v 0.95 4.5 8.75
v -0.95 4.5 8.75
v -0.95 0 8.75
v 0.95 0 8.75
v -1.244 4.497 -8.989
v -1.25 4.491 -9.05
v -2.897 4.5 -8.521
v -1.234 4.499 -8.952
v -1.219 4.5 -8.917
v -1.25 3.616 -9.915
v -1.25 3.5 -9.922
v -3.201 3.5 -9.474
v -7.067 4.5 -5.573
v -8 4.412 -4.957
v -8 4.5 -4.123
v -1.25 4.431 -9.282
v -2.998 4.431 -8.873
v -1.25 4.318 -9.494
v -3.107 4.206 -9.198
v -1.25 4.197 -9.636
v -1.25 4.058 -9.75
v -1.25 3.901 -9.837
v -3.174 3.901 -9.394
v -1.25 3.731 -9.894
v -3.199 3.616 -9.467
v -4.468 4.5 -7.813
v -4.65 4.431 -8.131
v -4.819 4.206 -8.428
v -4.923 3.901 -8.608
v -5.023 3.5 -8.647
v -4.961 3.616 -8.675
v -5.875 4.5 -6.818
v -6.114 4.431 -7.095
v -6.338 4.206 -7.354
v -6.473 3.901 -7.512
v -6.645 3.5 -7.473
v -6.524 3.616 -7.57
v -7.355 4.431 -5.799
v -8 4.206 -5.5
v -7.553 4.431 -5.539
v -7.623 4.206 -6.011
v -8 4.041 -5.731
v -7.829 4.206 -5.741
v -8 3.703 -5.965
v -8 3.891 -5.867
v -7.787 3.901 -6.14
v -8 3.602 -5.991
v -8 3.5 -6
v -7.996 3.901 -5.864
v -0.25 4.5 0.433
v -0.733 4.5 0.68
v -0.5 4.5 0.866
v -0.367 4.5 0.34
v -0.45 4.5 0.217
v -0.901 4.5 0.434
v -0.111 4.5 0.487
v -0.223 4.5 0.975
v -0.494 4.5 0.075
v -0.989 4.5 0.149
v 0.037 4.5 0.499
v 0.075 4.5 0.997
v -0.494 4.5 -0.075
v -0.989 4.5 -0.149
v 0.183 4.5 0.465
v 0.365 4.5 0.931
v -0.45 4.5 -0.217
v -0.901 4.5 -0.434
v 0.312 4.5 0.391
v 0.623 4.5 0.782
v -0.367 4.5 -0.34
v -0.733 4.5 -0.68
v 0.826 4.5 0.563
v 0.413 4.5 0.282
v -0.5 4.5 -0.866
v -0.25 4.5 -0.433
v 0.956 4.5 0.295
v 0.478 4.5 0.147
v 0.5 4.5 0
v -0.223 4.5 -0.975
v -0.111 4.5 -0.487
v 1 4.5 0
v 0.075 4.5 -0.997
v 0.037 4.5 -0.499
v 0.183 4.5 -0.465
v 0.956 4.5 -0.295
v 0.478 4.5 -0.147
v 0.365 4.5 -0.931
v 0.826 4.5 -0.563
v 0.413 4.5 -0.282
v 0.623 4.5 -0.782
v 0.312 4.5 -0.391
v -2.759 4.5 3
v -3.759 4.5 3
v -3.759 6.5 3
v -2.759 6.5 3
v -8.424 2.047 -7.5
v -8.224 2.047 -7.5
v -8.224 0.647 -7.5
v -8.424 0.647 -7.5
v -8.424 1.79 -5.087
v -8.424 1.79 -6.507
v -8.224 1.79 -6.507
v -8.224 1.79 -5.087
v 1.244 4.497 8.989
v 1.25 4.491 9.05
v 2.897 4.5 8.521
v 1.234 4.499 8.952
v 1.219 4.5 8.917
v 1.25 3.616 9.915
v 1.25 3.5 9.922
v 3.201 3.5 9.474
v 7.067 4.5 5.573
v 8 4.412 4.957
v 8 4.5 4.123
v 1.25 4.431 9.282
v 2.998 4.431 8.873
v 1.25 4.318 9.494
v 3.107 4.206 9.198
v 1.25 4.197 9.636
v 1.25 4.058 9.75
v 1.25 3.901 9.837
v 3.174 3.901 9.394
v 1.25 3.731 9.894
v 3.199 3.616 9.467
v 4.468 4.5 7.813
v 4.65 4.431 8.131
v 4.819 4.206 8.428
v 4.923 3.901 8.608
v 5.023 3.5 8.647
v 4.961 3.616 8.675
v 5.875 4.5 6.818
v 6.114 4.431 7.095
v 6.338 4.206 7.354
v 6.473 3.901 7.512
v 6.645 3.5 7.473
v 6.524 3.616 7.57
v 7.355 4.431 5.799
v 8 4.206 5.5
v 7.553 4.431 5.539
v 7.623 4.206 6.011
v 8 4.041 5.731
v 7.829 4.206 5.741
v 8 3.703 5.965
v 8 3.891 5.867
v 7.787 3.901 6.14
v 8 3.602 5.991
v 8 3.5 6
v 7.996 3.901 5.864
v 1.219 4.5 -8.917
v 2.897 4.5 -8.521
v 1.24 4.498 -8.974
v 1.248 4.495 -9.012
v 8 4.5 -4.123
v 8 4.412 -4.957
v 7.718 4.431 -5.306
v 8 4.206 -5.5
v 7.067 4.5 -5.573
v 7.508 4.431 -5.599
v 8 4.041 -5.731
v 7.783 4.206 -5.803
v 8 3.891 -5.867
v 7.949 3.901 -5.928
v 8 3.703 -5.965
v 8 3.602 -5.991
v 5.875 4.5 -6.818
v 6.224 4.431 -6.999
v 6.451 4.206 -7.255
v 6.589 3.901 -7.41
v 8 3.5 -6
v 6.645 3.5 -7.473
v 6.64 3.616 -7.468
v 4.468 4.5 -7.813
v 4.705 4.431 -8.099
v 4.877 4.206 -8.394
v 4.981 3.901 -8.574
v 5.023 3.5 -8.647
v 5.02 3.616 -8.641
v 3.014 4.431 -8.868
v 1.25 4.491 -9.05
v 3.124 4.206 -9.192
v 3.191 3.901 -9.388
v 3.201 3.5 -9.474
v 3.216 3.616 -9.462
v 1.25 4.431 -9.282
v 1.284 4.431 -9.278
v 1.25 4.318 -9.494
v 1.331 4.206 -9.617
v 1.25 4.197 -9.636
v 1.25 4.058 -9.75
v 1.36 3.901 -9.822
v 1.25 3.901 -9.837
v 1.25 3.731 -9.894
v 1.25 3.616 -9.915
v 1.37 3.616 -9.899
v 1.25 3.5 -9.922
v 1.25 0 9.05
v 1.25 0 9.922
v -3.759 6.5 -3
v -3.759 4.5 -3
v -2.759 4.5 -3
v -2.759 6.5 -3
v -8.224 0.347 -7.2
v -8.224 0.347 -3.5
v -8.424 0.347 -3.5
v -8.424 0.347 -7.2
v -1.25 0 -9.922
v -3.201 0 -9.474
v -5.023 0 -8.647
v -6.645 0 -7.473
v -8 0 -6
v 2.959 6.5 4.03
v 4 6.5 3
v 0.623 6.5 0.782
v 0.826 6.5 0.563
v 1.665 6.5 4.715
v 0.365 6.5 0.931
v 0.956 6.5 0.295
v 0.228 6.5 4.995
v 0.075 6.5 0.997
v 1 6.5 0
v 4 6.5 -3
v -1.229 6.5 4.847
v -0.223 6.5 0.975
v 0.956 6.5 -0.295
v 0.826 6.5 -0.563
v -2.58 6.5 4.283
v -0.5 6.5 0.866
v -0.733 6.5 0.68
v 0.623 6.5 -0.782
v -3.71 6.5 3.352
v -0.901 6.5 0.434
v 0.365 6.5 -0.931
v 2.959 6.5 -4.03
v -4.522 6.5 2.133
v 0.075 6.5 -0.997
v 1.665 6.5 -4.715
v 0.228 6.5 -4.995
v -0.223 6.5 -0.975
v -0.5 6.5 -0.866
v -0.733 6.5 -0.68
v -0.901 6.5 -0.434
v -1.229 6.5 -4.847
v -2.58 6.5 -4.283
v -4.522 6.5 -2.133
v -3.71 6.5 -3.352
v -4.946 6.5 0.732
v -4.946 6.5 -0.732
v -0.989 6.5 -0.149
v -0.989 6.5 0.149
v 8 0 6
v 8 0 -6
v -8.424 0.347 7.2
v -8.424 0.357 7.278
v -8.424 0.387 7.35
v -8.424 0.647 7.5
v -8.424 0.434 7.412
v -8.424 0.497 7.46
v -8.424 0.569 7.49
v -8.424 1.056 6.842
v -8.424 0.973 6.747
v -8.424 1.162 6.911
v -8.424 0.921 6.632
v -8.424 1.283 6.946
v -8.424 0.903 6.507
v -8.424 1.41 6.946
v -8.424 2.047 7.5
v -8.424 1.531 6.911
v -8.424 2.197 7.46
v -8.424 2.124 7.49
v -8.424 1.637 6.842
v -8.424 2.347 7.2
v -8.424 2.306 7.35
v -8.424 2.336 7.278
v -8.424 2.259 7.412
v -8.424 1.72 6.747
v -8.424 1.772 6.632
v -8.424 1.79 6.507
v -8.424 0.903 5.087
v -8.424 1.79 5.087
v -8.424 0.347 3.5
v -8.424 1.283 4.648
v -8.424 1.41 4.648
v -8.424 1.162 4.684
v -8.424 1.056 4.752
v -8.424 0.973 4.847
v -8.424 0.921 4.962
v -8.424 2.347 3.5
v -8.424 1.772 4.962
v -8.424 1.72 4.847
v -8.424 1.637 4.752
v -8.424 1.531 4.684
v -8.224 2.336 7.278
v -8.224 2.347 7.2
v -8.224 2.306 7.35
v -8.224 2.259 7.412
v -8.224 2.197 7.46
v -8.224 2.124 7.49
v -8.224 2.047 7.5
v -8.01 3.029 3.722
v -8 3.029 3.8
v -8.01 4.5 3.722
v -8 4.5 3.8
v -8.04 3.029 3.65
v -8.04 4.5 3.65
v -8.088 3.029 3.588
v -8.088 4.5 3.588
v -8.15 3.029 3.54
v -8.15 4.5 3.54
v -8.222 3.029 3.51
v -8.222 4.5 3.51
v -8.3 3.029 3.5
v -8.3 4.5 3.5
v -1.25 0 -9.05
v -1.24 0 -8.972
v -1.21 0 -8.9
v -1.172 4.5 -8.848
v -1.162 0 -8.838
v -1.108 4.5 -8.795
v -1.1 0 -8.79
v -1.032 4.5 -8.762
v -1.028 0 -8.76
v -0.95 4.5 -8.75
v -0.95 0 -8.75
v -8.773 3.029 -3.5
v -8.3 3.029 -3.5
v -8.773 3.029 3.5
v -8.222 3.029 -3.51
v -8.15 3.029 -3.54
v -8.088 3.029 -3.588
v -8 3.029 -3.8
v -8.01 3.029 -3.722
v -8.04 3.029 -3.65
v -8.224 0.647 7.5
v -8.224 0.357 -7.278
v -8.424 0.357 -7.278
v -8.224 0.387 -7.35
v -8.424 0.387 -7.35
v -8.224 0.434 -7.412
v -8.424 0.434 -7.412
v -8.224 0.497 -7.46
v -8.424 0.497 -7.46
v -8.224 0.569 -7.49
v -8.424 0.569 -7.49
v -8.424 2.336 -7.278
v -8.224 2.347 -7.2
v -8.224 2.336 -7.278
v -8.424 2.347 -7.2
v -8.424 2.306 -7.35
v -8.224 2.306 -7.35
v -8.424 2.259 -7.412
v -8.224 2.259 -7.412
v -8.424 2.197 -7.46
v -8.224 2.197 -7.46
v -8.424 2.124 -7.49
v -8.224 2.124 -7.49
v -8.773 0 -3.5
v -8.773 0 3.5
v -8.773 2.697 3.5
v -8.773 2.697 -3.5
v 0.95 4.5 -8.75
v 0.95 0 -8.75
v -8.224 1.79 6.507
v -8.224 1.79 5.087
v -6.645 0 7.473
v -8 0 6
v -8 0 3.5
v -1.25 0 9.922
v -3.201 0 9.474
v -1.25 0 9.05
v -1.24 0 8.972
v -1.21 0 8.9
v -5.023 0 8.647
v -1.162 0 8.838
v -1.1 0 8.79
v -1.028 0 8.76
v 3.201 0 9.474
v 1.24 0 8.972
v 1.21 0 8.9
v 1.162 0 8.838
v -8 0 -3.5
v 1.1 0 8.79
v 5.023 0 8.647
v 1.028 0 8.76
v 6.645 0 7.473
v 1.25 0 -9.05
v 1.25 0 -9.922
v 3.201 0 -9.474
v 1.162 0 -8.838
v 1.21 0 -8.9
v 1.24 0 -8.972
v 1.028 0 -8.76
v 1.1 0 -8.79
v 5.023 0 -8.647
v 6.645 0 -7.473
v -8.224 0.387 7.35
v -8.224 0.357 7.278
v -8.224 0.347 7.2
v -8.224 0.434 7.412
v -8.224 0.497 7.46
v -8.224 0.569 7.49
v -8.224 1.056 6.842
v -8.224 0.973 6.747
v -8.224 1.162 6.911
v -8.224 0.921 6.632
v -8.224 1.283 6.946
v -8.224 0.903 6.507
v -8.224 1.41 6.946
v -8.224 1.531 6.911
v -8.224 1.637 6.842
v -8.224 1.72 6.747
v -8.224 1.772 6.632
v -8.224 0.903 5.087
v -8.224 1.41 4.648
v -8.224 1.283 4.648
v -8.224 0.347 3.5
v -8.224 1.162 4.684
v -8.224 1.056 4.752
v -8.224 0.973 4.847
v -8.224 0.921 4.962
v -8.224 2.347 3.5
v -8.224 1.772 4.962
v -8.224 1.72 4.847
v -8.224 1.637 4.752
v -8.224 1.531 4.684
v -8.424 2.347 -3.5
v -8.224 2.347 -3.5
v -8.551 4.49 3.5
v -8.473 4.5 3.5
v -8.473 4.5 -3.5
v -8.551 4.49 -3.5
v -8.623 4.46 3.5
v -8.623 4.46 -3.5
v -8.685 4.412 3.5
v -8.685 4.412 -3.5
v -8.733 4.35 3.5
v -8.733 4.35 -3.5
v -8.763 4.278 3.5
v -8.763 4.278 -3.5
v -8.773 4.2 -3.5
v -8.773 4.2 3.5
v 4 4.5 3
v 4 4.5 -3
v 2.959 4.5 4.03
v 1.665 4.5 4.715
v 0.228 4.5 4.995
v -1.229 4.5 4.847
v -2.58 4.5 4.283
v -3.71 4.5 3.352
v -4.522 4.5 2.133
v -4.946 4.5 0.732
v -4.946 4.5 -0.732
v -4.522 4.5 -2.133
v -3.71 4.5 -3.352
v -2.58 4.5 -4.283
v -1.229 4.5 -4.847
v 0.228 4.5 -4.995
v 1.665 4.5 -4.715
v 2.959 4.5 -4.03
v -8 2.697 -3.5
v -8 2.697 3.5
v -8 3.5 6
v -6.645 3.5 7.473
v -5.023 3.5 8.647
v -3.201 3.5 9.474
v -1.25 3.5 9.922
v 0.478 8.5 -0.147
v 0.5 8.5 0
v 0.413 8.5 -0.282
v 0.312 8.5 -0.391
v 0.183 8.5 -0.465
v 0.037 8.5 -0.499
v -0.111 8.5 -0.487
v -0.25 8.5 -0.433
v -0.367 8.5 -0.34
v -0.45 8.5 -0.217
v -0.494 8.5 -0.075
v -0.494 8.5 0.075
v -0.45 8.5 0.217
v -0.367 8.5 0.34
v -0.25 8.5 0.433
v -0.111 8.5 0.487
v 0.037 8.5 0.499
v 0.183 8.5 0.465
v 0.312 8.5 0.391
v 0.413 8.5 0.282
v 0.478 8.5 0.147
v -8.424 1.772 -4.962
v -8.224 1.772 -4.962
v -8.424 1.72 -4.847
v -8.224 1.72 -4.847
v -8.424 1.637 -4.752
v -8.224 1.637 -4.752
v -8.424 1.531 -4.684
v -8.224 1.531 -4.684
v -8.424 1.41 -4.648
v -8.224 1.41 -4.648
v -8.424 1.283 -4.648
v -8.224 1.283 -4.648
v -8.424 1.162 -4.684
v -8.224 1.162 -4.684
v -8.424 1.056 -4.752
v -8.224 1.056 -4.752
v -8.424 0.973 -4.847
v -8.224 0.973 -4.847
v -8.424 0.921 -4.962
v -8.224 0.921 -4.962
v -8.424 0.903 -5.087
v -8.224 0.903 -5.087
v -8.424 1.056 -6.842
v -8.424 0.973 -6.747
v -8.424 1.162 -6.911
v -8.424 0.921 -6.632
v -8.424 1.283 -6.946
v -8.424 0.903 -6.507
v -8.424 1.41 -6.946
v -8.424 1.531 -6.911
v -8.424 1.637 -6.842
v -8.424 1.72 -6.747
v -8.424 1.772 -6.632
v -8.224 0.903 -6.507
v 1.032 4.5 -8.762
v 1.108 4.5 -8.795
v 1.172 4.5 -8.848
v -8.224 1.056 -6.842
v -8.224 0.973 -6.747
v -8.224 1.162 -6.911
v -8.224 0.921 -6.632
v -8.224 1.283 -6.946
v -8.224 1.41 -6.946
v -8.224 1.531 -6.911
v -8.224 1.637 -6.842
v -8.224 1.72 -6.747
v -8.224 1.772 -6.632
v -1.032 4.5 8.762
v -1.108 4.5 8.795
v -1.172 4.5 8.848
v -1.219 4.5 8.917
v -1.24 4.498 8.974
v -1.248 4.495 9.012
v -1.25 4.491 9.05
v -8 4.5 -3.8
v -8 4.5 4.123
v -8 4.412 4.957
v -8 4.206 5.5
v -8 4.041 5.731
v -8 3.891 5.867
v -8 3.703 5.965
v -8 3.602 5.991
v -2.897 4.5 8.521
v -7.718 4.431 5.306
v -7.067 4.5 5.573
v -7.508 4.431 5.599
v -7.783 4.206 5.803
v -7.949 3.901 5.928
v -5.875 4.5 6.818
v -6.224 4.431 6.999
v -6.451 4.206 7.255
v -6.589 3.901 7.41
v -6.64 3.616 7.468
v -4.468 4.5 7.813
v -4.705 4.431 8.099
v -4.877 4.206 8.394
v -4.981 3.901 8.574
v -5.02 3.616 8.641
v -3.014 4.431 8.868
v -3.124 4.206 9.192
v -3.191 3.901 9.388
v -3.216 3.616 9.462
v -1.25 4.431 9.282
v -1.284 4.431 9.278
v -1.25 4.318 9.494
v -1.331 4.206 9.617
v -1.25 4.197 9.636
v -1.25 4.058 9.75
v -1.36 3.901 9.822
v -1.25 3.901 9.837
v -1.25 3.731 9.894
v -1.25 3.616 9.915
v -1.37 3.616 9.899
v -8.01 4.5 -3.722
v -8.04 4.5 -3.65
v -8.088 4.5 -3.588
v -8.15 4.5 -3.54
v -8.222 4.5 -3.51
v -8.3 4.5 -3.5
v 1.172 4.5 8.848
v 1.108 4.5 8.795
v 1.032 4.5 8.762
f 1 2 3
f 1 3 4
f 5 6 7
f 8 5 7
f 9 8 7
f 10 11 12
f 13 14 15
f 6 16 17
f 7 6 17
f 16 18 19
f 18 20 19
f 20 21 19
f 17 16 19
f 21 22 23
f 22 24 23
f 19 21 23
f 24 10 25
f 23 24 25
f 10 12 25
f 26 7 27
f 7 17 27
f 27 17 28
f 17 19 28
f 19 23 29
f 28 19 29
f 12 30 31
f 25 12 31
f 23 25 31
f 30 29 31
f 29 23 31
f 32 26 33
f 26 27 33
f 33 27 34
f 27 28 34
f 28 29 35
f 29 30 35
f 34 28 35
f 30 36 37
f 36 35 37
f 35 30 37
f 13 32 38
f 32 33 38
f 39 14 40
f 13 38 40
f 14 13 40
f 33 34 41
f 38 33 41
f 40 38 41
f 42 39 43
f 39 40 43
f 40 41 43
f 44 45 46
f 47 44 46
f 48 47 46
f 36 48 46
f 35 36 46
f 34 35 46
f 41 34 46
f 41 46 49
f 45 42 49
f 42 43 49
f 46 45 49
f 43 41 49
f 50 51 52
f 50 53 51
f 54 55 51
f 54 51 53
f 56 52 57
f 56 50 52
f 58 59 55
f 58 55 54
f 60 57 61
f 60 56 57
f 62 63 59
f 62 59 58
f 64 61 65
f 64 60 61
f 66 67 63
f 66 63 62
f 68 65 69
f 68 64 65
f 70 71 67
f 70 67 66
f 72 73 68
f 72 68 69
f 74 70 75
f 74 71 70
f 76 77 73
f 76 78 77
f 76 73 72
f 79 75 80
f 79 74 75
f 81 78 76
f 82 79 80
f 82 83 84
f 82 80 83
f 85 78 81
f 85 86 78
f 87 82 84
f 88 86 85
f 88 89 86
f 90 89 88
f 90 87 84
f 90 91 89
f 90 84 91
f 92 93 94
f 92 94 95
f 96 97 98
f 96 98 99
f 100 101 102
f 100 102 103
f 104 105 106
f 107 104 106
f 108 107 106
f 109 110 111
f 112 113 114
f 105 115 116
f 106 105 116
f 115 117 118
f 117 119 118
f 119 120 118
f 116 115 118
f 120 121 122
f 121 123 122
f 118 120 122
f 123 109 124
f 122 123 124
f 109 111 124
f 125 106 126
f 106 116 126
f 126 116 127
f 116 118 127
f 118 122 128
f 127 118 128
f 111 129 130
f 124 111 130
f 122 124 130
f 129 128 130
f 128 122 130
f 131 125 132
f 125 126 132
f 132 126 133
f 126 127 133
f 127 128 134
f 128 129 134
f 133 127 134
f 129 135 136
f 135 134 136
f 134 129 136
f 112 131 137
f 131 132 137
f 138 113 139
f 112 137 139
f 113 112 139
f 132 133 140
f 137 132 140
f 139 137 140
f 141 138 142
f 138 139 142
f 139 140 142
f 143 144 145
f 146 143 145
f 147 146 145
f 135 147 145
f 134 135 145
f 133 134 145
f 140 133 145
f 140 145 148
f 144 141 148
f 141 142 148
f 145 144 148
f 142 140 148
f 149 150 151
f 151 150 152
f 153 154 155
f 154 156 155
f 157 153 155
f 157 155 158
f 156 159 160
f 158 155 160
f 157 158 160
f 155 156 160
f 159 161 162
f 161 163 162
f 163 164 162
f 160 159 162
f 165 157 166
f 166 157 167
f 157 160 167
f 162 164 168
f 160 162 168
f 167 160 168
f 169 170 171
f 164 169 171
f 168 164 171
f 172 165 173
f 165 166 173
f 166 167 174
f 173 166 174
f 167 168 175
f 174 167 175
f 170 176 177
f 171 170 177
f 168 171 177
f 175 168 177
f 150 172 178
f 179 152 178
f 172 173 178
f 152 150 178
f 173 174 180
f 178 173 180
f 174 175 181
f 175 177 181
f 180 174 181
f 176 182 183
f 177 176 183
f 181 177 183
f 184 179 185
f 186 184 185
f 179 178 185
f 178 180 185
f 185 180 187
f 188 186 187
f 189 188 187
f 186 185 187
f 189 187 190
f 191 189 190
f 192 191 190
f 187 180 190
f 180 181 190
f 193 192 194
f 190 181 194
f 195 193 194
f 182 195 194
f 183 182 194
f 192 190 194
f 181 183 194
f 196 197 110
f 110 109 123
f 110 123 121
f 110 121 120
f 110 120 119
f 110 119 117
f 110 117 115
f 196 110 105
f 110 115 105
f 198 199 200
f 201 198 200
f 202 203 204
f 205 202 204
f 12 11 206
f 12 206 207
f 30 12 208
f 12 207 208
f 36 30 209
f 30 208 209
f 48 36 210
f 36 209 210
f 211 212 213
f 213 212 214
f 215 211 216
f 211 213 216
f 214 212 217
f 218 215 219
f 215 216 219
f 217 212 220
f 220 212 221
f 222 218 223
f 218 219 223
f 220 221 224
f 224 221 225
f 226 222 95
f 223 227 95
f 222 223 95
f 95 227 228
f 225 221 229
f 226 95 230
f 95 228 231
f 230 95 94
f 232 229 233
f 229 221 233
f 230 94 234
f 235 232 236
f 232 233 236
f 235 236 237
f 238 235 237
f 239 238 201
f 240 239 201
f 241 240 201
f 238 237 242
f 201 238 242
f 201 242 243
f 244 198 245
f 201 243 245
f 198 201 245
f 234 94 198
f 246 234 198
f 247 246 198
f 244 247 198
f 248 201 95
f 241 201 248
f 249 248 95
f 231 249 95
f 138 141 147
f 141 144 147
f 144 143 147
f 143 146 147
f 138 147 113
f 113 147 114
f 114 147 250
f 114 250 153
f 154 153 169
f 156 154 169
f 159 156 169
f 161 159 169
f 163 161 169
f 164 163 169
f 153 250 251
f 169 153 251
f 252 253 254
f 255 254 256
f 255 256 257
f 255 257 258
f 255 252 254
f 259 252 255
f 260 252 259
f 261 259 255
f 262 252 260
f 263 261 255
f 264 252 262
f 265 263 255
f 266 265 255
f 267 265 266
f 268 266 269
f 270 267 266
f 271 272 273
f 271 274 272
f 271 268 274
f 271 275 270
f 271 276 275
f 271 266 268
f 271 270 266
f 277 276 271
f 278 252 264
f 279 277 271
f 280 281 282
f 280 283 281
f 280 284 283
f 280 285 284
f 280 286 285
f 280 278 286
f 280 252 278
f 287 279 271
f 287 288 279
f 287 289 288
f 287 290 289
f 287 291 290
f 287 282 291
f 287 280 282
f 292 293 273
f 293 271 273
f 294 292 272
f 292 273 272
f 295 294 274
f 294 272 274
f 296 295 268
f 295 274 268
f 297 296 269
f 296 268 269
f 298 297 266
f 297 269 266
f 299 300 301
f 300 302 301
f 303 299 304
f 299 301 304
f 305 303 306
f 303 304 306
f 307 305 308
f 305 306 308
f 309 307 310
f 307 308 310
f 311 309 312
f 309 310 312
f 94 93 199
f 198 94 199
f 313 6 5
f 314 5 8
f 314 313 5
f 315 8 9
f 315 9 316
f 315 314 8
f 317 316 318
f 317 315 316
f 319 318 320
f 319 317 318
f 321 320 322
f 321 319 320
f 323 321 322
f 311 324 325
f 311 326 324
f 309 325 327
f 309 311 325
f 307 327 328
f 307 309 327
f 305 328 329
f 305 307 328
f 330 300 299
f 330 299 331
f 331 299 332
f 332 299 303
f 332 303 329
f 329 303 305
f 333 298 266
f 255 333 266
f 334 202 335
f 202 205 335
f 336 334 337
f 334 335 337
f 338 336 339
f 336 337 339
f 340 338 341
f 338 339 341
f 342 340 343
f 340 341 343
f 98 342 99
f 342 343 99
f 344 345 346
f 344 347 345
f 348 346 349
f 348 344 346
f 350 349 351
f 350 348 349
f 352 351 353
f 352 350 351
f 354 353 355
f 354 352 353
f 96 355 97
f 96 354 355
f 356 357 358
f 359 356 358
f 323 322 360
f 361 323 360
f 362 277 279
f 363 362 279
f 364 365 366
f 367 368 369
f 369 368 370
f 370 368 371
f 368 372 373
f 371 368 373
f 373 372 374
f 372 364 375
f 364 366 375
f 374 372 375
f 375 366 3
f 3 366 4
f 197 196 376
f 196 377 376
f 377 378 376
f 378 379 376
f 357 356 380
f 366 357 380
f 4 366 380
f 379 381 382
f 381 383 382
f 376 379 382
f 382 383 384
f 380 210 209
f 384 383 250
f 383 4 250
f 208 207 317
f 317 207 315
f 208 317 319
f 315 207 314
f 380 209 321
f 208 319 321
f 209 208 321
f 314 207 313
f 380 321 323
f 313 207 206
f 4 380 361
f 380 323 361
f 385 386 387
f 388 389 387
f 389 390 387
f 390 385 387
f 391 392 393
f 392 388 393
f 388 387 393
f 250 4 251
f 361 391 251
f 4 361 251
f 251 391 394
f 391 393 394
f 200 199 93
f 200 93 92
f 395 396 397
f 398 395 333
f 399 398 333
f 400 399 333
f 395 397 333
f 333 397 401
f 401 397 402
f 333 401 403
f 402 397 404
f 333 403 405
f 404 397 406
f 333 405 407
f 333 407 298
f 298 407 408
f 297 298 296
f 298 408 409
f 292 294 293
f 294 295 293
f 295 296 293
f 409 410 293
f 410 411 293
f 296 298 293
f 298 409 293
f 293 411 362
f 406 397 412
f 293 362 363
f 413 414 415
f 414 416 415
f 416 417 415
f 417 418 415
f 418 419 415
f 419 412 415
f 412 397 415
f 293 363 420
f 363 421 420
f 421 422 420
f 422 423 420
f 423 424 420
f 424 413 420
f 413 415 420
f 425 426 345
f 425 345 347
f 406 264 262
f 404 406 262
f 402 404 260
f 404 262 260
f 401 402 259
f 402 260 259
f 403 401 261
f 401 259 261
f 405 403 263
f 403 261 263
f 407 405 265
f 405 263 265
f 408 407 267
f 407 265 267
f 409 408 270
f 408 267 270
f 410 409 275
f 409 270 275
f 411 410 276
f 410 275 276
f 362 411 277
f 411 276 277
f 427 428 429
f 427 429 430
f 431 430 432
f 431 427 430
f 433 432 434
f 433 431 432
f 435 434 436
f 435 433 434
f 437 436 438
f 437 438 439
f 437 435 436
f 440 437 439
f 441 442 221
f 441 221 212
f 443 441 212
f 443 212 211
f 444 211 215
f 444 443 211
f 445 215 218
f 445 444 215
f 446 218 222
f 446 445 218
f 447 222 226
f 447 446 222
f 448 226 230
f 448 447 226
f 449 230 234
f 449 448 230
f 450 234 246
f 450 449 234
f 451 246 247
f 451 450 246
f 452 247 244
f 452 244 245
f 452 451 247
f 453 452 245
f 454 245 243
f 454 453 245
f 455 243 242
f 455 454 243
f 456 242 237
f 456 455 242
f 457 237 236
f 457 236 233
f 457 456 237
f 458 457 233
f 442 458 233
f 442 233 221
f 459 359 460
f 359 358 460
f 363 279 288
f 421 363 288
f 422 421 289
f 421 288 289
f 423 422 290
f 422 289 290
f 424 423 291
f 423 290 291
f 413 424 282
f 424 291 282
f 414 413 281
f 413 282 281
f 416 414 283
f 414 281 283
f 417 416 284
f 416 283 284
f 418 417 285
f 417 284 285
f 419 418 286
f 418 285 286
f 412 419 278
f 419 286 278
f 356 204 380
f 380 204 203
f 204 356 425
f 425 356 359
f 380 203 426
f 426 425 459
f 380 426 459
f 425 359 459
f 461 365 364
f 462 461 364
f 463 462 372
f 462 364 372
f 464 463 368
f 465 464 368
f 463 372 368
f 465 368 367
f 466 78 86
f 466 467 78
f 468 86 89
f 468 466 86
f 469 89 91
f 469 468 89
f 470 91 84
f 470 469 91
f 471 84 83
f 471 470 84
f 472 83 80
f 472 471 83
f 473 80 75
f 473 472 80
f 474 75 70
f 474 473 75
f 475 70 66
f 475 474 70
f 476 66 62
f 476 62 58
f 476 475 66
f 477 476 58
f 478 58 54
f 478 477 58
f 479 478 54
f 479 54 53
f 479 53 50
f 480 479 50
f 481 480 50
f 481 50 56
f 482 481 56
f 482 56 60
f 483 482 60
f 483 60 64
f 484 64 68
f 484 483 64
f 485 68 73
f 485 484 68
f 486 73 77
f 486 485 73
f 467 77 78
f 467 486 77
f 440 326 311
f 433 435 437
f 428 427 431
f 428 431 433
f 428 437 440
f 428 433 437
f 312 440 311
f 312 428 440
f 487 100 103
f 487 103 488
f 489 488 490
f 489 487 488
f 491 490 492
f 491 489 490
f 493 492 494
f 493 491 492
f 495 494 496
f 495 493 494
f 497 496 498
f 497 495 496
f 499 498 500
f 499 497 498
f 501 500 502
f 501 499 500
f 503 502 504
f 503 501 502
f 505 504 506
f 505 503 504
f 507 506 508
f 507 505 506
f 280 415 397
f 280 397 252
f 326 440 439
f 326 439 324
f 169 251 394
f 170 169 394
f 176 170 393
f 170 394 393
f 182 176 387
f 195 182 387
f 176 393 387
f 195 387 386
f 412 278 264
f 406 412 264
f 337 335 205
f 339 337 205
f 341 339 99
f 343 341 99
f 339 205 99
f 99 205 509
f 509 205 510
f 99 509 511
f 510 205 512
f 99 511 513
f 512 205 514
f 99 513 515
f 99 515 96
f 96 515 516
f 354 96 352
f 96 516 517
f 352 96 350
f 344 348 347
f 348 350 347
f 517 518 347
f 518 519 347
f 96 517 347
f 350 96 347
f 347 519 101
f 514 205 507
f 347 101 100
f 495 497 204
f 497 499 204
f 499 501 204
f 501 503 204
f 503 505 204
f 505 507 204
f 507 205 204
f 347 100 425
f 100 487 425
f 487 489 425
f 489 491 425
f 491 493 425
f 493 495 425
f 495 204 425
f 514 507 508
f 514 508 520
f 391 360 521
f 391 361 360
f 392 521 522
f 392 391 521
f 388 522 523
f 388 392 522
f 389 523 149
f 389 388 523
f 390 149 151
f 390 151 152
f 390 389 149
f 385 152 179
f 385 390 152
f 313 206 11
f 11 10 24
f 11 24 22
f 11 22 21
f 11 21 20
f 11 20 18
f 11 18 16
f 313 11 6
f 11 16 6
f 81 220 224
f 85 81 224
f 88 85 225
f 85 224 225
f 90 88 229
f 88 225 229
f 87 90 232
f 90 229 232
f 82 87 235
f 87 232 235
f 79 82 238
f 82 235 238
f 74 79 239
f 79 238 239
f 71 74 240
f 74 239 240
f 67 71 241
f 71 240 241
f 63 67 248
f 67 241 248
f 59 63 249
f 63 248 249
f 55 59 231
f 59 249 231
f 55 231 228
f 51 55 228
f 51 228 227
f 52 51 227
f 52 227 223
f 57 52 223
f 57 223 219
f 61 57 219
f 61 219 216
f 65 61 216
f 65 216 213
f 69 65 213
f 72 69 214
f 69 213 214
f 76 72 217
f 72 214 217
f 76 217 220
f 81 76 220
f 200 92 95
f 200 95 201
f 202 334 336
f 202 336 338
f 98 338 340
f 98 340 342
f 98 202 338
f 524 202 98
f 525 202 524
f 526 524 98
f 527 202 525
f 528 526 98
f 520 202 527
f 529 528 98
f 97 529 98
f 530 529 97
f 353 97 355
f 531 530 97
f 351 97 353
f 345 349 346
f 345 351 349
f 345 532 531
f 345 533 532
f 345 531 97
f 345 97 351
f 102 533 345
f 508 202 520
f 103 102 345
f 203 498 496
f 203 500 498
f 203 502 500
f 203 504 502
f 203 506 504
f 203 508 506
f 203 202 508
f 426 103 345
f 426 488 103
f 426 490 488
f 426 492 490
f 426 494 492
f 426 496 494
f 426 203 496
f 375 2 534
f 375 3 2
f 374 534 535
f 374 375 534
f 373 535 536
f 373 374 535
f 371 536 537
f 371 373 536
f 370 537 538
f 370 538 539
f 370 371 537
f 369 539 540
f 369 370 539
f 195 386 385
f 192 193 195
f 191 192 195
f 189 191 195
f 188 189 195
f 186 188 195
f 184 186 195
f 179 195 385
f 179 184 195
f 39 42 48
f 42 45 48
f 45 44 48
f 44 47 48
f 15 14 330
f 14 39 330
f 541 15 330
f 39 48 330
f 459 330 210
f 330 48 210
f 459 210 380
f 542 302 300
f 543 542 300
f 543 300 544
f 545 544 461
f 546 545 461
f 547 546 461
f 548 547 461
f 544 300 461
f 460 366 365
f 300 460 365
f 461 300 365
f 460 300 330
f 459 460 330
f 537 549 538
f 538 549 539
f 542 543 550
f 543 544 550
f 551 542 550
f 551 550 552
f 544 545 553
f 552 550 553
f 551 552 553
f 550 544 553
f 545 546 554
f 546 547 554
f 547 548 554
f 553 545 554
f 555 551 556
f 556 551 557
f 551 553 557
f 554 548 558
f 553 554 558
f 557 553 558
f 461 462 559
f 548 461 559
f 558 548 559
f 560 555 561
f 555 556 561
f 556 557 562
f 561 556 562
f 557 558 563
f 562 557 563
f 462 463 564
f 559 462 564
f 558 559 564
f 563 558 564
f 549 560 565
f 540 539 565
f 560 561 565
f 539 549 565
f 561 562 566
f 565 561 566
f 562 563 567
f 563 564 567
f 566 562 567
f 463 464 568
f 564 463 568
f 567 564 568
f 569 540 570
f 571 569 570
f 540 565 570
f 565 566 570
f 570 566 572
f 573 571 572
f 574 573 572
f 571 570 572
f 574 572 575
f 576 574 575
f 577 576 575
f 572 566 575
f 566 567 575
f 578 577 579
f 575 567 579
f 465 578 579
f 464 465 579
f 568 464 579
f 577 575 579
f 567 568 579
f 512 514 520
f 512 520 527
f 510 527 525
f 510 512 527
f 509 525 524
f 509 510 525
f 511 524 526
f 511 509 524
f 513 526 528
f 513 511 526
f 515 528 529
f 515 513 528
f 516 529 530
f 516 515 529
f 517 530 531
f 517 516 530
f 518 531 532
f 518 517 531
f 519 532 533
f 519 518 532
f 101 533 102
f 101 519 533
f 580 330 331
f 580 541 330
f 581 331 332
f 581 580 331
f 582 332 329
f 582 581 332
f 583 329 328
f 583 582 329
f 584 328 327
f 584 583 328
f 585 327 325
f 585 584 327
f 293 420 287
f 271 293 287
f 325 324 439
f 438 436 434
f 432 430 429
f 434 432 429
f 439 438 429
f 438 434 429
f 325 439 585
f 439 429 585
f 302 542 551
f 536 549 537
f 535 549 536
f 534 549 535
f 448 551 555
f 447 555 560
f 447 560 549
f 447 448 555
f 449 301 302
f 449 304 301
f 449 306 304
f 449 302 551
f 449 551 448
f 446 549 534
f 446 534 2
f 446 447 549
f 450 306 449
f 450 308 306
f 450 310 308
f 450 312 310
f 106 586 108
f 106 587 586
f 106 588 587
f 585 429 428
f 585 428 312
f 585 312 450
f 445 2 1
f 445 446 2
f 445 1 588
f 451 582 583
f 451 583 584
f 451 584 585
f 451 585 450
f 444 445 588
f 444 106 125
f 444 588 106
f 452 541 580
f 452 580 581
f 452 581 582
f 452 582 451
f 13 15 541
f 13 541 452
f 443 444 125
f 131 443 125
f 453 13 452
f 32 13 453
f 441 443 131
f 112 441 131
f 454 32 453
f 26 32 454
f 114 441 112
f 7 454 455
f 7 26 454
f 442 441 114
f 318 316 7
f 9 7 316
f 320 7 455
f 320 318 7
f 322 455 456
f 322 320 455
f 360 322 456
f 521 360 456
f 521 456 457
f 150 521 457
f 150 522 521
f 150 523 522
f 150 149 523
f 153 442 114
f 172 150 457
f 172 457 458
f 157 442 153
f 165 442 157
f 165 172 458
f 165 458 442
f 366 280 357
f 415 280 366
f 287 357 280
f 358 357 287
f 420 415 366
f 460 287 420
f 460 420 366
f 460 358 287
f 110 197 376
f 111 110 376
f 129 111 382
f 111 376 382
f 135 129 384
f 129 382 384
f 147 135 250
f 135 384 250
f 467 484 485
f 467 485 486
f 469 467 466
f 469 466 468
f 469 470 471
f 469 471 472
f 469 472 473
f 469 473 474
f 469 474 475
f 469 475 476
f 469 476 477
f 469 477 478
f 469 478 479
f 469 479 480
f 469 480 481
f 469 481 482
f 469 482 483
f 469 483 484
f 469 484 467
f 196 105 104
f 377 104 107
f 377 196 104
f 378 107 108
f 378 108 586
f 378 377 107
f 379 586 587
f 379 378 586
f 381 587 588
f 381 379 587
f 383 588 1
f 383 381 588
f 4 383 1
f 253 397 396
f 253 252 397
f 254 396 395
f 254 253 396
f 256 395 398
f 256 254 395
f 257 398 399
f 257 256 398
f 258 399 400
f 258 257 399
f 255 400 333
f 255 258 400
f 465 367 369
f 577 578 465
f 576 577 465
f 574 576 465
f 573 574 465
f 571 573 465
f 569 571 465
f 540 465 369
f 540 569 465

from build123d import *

# Parameters (mm, degrees)
BOSS_EXTRUDE1_DEPTH  = 4.5
SKETCH2_W            = 1
SKETCH2_H            = 6
BOSS_EXTRUDE2_DEPTH  = 2
SKETCH3_R            = 1
SKETCH3_R_2          = 0.5
CUT_EXTRUDE1_DEPTH   = 2
SKETCH3_2_R          = 0.5
BOSS_EXTRUDE3_DEPTH  = 2
FILLET1_R            = 1
SKETCH4_W            = 2.5
SKETCH4_H            = 2.5
CUT_EXTRUDE2_DEPTH   = 5.5000001
FILLET2_R            = 0.3
BOSS_EXTRUDE4_DEPTH  = 3.5
FILLET3_R            = 0.3
SKETCH7_W            = 0.772874032
SKETCH7_H            = 2.696512764
BOSS_EXTRUDE5_DEPTH  = 3.5
SKETCH8_W            = 0.2
SKETCH8_H            = 2
BOSS_EXTRUDE6_DEPTH  = 4
FILLET4_R            = 0.3
CUT_EXTRUDE3_DEPTH   = 0.2
FILLET4_OF_MIRROR2_R = 0.3


with BuildPart() as part:
    # Sketch1 → Boss-Extrude1 (new body)
    with BuildSketch(Plane(origin=(0, 0, 0), x_dir=(1, 0, 0), z_dir=(0, 1, 0))):
        with BuildLine():
            Line((8, -6), (8, 6))
            ThreePointArc((8, 6), (0, 10), (-8, 6))
            Line((-8, 6), (-8, -6))
            ThreePointArc((-8, -6), (0, -10), (8, -6))
        make_face()
    extrude(amount=BOSS_EXTRUDE1_DEPTH)

    # Sketch2 → Boss-Extrude2 (add)
    with BuildSketch(Plane(origin=(0, 4.5, 0), x_dir=(1, 0, 0), z_dir=(0, 1, 0))):
        with BuildLine():
            Line((4, 3), (4, -3))
            ThreePointArc((4, -3), (-5, 0), (4, 3))
        make_face()
        with Locations((-3.258806918, 0)):
            Rectangle(SKETCH2_W, SKETCH2_H, mode=Mode.SUBTRACT)
    extrude(amount=BOSS_EXTRUDE2_DEPTH)

    # Sketch3 → Cut-Extrude1 (cut)
    with BuildSketch(Plane(origin=(0, 6.5, 0), x_dir=(1, 0, 0), z_dir=(0, 1, 0))):
        Circle(SKETCH3_R)
        Circle(SKETCH3_R_2, mode=Mode.SUBTRACT)
    extrude(amount=-CUT_EXTRUDE1_DEPTH, mode=Mode.SUBTRACT)

    # Sketch3<2> → Boss-Extrude3 (add)
    with BuildSketch(Plane(origin=(0, 6.5, 0), x_dir=(1, 0, 0), z_dir=(0, 1, 0))):
        Circle(SKETCH3_2_R)
    extrude(amount=BOSS_EXTRUDE3_DEPTH)

    # Fillet1
    fillet1_edges = [part.edges().sort_by_distance(p)[0] for p in [
        (0, 4.5, 10),
        (0, 4.5, -10),
    ]]
    fillet(fillet1_edges, radius=FILLET1_R)

    # Sketch4 → Cut-Extrude2 (cut, through all)
    with BuildSketch(Plane(origin=(0, 4.5, 0), x_dir=(1, 0, 0), z_dir=(0, 1, 0))):
        with Locations((0, -10)):
            Rectangle(SKETCH4_W, SKETCH4_H)
    cut_extrude2 = extrude(amount=-CUT_EXTRUDE2_DEPTH, mode=Mode.SUBTRACT)

    # Mirror1: Cut-Extrude2 across plane
    add(cut_extrude2.mirror(Plane.XY), mode=Mode.SUBTRACT)

    # Fillet2
    fillet2_edges = [part.edges().sort_by_distance(p)[0] for p in [
        (-1.25, 2.25, -8.75),
        (1.25, 2.25, -8.75),
        (1.25, 2.25, 8.75),
        (-1.25, 2.25, 8.75),
    ]]
    fillet(fillet2_edges, radius=FILLET2_R)

    # Sketch6 → Boss-Extrude4 (add, symmetric)
    with BuildSketch(Plane.XY):
        with BuildLine():
            Line((-8, 4.5), (-8.472874032, 4.5))
            ThreePointArc((-8.472874032, 4.5), (-8.685006066, 4.412132034), (-8.772874032, 4.2))
            Line((-8.772874032, 4.2), (-8.772874032, 3.028910777))
            Line((-8.772874032, 3.028910777), (-8, 3.028910777))
            Line((-8, 3.028910777), (-8, 4.5))
        make_face()
    extrude(amount=BOSS_EXTRUDE4_DEPTH, both=True)

    # Fillet3
    fillet3_edges = [part.edges().sort_by_distance(p)[0] for p in [
        (-8, 3.764455388, -3.5),
        (-8, 3.764455388, 3.5),
    ]]
    fillet(fillet3_edges, radius=FILLET3_R)

    # Sketch7 → Boss-Extrude5 (add, symmetric)
    with BuildSketch(Plane.XY):
        with Locations((-8.386437016, 1.348256382)):
            Rectangle(SKETCH7_W, SKETCH7_H)
    extrude(amount=BOSS_EXTRUDE5_DEPTH, both=True)

    # Sketch8 → Boss-Extrude6 (add)
    with BuildSketch(Plane(origin=(0, 0, -3.5), x_dir=(-1, 0, 0), z_dir=(0, 0, -1))):
        with Locations((8.323724086, 1.346512764)):
            Rectangle(SKETCH8_W, SKETCH8_H)
    boss_extrude6 = extrude(amount=BOSS_EXTRUDE6_DEPTH)

    # Fillet4
    fillet4_edges = [part.edges().sort_by_distance(p)[0] for p in [
        (-8.323724086, 0.346512764, -7.5),
        (-8.323724086, 2.346512764, -7.5),
    ]]
    fillet(fillet4_edges, radius=FILLET4_R)

    # Sketch9 → Cut-Extrude3 (cut)
    with BuildSketch(Plane.ZY.offset(8.423724086)):
        with BuildLine():
            Line((-6.506992038, 1.790165147), (-5.08730441, 1.790165147))
            ThreePointArc((-5.08730441, 1.790165147), (-4.643652026, 1.346512764), (-5.08730441, 0.90286038))
            Line((-5.08730441, 0.90286038), (-6.506992038, 0.90286038))
            ThreePointArc((-6.506992038, 0.90286038), (-6.950644422, 1.346512764), (-6.506992038, 1.790165147))
        make_face()
    cut_extrude3 = extrude(amount=-CUT_EXTRUDE3_DEPTH, mode=Mode.SUBTRACT)

    # Mirror2: Boss-Extrude6, Cut-Extrude3 across plane
    add(boss_extrude6.mirror(Plane.XY))
    add(cut_extrude3.mirror(Plane.XY), mode=Mode.SUBTRACT)

    # Fillet4 of Mirror2
    fillet4_of_mirror2_edges = [part.edges().sort_by_distance(p)[0] for p in [
        (-8.323724086, 0.346512764, 7.5),
        (-8.323724086, 2.346512764, 7.5),
    ]]
    fillet(fillet4_of_mirror2_edges, radius=FILLET4_OF_MIRROR2_R)


solid = part.part
